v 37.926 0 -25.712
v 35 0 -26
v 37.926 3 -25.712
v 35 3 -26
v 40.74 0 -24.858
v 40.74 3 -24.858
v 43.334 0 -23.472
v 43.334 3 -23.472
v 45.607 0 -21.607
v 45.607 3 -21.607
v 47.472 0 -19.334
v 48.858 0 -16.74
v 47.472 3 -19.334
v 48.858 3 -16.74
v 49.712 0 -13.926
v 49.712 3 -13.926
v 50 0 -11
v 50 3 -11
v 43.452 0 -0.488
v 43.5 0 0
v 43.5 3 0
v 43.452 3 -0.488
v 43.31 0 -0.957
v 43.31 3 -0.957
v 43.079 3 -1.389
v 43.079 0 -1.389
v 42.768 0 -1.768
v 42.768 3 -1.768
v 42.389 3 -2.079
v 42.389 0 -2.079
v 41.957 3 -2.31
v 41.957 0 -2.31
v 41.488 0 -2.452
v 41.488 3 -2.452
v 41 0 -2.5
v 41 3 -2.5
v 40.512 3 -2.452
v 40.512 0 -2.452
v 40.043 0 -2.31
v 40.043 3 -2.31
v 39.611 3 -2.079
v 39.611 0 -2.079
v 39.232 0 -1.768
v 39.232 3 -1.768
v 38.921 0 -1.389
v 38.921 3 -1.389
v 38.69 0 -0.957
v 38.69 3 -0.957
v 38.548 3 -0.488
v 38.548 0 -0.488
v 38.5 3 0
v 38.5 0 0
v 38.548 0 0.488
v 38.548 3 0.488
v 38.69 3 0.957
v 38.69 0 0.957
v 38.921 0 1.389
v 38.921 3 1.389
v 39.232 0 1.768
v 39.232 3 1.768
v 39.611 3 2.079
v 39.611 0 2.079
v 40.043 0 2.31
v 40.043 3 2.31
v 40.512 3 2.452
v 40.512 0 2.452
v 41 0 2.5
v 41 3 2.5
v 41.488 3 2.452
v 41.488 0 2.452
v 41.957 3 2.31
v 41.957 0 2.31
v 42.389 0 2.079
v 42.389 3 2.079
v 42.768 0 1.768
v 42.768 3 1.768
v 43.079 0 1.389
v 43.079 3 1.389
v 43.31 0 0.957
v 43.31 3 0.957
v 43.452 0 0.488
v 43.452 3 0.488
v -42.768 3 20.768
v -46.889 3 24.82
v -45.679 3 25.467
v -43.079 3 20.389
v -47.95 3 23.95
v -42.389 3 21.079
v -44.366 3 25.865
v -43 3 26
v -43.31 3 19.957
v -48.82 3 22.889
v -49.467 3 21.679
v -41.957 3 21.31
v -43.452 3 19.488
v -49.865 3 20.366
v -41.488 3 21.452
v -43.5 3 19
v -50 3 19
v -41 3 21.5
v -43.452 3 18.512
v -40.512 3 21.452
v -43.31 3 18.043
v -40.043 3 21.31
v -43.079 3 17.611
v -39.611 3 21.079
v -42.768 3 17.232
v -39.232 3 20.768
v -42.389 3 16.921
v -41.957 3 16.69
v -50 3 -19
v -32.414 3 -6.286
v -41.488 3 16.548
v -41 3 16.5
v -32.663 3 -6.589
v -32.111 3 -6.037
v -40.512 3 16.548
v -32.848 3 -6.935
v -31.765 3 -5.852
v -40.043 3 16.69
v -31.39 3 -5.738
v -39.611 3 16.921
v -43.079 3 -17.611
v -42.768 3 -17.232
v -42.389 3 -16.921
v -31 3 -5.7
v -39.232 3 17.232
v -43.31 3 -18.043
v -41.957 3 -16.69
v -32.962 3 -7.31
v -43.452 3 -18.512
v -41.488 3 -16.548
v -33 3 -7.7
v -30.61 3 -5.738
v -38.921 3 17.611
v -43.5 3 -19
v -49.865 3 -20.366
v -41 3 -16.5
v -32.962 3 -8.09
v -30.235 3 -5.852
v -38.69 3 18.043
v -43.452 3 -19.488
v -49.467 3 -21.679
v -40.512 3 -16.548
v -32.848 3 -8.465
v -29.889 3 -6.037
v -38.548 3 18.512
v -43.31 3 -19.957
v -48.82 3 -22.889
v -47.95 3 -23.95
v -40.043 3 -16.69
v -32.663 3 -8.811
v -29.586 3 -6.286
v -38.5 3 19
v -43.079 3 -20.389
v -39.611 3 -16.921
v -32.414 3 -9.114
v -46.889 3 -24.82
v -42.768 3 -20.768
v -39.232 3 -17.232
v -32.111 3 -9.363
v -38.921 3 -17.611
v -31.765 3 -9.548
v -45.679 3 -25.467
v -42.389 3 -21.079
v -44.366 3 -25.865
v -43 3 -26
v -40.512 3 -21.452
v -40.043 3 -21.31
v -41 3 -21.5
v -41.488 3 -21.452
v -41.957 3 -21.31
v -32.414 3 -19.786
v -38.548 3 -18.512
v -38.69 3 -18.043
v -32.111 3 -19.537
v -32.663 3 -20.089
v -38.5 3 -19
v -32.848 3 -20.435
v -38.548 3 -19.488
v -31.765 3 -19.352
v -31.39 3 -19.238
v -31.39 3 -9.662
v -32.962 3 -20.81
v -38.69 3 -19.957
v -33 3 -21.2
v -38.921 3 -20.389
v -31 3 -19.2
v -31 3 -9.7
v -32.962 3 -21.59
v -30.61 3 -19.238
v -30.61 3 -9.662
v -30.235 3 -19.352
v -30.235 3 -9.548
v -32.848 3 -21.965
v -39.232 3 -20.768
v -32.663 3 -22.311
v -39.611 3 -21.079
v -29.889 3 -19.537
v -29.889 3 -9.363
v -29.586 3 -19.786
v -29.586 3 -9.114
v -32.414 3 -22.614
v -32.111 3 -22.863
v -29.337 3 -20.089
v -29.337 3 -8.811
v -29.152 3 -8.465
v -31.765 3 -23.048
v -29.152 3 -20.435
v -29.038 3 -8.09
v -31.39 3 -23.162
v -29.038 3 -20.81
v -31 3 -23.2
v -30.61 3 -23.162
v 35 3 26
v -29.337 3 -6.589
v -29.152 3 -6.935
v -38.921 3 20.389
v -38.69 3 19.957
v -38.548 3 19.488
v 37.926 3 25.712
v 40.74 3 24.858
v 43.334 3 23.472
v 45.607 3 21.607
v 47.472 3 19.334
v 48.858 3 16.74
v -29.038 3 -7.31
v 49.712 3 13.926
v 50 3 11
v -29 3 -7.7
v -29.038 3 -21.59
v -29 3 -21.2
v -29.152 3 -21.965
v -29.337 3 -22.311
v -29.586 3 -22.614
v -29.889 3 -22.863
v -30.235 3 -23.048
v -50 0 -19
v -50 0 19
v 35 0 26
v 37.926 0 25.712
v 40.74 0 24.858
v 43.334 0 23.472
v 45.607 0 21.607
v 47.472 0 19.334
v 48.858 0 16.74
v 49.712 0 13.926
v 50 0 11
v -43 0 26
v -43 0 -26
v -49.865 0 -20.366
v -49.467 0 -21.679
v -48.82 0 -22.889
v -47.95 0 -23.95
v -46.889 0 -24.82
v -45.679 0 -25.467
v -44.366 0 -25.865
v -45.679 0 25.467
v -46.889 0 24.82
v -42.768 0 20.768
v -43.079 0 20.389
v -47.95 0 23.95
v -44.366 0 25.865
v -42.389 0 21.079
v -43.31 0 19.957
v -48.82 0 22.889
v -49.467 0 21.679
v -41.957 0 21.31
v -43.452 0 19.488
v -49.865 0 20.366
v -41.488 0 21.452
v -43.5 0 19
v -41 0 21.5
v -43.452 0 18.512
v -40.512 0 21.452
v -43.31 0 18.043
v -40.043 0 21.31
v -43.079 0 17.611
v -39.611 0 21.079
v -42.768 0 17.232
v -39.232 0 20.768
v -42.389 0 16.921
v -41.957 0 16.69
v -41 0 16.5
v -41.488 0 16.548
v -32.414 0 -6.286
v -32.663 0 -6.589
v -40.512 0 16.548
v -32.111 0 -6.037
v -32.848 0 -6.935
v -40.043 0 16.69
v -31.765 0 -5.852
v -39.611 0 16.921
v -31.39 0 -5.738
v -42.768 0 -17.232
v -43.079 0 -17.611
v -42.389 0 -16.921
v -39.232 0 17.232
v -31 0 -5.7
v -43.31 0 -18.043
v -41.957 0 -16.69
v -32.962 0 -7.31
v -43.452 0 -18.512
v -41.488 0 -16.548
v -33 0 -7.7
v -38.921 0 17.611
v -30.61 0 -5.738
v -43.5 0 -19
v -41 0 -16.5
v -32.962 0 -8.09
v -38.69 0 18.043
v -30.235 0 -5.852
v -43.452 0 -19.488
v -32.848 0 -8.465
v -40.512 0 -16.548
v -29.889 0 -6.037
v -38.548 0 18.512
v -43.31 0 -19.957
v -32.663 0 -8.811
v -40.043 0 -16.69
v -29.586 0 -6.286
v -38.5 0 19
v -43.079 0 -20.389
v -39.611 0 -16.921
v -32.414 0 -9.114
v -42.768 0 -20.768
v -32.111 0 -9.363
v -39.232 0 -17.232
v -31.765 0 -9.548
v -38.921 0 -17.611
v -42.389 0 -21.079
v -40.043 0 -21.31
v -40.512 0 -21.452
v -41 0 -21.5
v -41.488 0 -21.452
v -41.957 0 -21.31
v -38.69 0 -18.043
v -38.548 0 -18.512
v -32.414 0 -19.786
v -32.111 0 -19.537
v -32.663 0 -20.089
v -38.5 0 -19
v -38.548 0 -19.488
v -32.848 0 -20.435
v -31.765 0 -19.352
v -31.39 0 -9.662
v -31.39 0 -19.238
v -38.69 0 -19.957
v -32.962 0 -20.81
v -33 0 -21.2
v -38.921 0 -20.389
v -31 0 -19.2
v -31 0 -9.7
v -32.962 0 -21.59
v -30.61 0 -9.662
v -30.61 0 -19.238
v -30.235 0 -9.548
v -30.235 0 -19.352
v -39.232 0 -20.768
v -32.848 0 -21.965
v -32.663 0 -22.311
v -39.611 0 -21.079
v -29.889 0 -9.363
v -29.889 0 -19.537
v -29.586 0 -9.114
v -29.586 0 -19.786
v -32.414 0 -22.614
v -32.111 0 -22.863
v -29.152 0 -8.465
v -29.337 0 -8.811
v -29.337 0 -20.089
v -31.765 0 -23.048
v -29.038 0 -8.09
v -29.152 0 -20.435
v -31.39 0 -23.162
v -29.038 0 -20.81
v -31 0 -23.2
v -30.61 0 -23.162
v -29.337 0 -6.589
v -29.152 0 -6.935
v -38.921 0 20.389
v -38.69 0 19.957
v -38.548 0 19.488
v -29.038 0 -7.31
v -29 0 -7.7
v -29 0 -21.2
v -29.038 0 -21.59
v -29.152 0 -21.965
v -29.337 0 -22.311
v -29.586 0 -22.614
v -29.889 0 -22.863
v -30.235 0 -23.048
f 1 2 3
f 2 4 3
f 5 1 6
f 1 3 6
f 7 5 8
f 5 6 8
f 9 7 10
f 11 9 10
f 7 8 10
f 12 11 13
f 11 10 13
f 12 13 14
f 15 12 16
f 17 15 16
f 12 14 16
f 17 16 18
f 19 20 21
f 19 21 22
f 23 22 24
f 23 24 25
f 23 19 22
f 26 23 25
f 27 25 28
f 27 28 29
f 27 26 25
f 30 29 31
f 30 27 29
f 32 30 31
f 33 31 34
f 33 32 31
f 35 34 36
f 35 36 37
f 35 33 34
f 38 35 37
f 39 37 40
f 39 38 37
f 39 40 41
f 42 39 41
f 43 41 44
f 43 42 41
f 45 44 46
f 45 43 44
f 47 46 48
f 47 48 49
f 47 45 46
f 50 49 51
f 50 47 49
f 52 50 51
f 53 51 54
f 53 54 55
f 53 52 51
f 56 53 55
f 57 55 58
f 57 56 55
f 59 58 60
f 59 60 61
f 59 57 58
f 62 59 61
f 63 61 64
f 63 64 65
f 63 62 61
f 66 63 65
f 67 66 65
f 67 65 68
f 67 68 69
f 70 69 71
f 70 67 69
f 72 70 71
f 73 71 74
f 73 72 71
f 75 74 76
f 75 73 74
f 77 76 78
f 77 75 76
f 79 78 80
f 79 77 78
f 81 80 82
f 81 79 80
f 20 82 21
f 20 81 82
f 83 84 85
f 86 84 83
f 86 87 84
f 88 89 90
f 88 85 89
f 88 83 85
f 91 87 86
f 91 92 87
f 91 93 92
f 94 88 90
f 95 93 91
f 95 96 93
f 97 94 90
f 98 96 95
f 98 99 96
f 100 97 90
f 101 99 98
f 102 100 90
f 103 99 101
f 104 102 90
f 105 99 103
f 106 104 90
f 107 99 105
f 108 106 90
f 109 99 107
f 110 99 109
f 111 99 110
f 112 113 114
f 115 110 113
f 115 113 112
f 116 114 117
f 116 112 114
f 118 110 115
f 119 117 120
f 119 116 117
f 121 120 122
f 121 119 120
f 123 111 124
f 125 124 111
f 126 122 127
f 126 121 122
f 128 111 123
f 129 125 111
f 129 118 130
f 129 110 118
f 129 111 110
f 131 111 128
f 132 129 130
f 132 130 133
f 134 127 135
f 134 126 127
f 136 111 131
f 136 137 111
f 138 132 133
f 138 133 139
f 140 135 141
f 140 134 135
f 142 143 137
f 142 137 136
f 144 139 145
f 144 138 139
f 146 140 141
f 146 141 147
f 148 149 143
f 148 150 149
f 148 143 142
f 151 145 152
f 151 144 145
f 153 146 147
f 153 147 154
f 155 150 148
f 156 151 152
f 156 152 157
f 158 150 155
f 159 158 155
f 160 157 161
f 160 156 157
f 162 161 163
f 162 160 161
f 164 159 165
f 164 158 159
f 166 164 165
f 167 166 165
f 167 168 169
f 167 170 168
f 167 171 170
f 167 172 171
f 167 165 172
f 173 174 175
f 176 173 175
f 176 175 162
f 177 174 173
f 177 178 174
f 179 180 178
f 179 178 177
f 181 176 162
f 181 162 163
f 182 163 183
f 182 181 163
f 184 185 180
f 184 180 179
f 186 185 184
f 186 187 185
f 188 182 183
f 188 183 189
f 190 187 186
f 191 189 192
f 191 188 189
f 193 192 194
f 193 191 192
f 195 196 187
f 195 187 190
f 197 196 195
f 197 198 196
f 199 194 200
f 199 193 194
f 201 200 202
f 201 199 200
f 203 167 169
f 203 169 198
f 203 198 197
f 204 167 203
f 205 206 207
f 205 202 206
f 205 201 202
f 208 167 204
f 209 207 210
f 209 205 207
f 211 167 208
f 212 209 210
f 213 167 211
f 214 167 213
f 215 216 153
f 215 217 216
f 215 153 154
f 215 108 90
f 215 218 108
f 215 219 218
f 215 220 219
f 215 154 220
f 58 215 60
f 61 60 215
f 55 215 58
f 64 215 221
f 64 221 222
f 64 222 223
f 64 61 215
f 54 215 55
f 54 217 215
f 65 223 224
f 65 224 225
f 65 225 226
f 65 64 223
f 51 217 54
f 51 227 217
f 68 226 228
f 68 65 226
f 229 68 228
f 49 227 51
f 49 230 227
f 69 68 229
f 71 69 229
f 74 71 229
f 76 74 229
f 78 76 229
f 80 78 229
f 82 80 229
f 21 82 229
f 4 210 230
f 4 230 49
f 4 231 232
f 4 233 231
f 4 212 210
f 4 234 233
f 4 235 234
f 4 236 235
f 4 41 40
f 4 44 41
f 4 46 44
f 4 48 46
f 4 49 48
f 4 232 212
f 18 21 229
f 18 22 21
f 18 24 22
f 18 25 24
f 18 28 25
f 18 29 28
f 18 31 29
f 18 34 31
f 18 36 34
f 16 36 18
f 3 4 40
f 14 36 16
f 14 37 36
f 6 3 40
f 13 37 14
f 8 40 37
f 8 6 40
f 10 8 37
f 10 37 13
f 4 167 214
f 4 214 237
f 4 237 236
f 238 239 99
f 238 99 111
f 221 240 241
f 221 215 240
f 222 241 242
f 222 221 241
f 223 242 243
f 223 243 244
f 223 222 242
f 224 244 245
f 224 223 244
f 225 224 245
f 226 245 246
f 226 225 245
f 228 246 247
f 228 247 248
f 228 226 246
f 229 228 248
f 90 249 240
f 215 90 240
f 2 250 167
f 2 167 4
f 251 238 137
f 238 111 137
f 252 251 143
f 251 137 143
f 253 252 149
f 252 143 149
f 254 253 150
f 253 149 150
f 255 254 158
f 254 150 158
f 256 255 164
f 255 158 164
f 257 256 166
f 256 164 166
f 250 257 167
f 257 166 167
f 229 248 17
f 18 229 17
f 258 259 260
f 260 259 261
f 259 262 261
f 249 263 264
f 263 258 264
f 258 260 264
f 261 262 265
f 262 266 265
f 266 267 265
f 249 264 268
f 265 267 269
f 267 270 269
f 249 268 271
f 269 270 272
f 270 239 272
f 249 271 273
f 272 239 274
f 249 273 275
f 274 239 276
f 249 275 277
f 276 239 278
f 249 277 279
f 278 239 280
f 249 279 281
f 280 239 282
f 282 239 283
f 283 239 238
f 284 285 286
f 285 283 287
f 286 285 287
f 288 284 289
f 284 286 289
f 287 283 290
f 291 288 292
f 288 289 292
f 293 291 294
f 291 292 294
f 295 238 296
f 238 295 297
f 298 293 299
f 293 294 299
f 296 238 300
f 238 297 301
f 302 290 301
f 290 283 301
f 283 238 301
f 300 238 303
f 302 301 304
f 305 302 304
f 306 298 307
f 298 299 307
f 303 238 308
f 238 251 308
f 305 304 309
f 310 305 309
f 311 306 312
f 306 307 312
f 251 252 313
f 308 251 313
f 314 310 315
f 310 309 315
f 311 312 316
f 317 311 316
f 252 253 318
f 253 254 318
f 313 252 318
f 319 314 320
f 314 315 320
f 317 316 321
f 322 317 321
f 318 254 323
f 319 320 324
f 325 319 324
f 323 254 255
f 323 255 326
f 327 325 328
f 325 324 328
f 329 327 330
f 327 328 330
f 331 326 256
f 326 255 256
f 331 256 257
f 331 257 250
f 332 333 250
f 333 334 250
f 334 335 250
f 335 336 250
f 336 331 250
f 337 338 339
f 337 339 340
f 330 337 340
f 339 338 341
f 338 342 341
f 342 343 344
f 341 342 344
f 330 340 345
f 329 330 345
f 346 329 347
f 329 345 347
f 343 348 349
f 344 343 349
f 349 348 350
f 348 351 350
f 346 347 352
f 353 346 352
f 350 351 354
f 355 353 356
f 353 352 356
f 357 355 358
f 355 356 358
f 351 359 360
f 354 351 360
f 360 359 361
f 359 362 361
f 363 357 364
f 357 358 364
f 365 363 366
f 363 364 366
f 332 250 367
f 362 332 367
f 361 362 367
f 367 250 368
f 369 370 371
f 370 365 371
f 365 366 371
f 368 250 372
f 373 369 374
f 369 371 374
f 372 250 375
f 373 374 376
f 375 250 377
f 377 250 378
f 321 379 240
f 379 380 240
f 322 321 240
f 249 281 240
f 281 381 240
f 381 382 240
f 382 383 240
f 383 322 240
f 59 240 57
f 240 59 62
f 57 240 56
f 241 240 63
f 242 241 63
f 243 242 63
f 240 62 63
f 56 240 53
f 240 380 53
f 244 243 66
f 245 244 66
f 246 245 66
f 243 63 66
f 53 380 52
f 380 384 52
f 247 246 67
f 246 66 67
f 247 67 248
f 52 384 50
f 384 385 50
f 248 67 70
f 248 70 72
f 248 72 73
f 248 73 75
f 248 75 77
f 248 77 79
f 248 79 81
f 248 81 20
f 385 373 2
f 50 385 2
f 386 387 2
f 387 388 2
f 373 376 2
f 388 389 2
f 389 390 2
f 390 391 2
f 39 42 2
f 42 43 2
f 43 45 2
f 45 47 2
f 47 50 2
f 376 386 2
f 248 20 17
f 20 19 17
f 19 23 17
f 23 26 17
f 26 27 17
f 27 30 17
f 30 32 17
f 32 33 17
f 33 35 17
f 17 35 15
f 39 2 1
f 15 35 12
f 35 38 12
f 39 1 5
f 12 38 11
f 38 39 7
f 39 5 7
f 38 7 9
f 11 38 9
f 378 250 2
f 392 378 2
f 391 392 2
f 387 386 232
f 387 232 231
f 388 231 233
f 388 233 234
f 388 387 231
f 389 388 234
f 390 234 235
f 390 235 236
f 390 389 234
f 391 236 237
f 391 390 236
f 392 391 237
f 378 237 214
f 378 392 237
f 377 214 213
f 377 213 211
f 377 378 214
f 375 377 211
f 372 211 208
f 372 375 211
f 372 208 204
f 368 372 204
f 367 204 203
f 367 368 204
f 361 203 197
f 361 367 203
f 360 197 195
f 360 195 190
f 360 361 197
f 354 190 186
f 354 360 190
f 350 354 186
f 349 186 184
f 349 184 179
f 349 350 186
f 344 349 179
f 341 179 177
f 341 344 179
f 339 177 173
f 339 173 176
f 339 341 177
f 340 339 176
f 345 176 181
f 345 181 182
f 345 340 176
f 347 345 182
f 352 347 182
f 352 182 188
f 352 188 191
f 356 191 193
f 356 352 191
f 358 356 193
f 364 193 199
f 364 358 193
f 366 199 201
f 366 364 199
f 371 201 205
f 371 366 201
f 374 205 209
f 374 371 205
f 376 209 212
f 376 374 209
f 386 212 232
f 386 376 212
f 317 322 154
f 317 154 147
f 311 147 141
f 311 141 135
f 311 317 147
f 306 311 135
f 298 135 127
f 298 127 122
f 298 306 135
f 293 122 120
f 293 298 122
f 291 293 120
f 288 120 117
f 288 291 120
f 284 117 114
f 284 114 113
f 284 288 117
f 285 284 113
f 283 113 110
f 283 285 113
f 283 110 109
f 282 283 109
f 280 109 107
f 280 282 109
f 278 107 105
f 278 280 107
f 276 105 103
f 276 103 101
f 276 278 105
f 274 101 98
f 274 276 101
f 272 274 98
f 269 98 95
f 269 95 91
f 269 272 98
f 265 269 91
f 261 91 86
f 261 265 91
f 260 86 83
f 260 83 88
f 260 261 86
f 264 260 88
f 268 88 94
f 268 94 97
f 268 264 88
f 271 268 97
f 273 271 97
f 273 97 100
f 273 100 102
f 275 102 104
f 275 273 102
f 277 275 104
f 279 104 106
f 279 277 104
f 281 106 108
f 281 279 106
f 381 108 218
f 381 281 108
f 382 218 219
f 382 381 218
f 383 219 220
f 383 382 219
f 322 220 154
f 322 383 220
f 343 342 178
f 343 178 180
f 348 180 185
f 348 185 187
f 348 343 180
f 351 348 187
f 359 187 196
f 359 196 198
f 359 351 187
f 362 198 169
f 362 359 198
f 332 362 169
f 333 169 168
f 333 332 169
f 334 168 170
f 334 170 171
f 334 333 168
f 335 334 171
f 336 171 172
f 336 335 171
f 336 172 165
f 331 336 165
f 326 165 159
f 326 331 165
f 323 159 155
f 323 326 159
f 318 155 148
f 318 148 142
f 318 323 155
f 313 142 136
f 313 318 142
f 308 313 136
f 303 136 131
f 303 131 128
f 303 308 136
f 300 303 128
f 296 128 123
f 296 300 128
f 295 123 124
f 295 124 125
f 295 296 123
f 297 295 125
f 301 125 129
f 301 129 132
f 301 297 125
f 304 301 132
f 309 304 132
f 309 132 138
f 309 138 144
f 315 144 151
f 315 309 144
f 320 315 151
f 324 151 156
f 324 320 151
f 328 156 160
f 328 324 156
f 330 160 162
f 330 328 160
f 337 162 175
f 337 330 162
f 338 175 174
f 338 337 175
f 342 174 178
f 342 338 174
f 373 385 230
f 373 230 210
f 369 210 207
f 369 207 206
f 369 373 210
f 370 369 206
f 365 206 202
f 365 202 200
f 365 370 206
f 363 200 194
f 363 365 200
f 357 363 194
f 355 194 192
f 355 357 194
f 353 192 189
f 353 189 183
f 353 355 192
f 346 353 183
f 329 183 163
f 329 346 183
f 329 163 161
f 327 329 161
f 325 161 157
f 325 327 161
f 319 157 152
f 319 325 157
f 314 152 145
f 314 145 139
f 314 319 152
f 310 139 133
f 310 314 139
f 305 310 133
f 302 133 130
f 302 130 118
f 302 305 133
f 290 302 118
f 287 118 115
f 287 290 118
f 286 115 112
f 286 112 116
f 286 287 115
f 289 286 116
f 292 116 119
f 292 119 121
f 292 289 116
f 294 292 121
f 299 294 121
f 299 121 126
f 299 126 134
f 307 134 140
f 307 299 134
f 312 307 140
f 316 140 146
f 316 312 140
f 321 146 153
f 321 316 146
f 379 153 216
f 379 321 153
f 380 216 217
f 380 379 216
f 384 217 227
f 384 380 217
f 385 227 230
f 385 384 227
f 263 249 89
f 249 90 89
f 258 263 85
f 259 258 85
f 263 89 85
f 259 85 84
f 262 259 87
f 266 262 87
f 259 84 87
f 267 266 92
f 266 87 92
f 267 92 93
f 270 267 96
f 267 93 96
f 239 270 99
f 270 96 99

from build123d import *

# Parameters (mm, degrees)
SKETCH1_W           = 100
SKETCH1_H           = 52
SKETCH1_R           = 2.5
SKETCH1_R_2         = 2
BOSS_EXTRUDE1_DEPTH = 3
FILLET1_R           = 15
FILLET2_R           = 7


with BuildPart() as part:
    # Sketch1 → Boss-Extrude1 (new body)
    with BuildSketch(Plane(origin=(0, 0, 0), x_dir=(1, 0, 0), z_dir=(0, 1, 0))):
        Rectangle(SKETCH1_W, SKETCH1_H)
        with Locations((41, 0)):
            Circle(SKETCH1_R, mode=Mode.SUBTRACT)
        with Locations((-41, 19)):
            Circle(SKETCH1_R, mode=Mode.SUBTRACT)
        with Locations((-41, -19)):
            Circle(SKETCH1_R, mode=Mode.SUBTRACT)
        with Locations((-31, 21.2)):
            Circle(SKETCH1_R_2, mode=Mode.SUBTRACT)
        with Locations((-31, 7.7)):
            Circle(SKETCH1_R_2, mode=Mode.SUBTRACT)
    extrude(amount=BOSS_EXTRUDE1_DEPTH)

    # Fillet1
    fillet1_edges = [part.edges().sort_by_distance(p)[0] for p in [
        (50, 1.5, 26),
        (50, 1.5, -26),
    ]]
    fillet(fillet1_edges, radius=FILLET1_R)

    # Fillet2
    fillet2_edges = [part.edges().sort_by_distance(p)[0] for p in [
        (-50, 1.5, 26),
        (-50, 1.5, -26),
    ]]
    fillet(fillet2_edges, radius=FILLET2_R)


solid = part.part
